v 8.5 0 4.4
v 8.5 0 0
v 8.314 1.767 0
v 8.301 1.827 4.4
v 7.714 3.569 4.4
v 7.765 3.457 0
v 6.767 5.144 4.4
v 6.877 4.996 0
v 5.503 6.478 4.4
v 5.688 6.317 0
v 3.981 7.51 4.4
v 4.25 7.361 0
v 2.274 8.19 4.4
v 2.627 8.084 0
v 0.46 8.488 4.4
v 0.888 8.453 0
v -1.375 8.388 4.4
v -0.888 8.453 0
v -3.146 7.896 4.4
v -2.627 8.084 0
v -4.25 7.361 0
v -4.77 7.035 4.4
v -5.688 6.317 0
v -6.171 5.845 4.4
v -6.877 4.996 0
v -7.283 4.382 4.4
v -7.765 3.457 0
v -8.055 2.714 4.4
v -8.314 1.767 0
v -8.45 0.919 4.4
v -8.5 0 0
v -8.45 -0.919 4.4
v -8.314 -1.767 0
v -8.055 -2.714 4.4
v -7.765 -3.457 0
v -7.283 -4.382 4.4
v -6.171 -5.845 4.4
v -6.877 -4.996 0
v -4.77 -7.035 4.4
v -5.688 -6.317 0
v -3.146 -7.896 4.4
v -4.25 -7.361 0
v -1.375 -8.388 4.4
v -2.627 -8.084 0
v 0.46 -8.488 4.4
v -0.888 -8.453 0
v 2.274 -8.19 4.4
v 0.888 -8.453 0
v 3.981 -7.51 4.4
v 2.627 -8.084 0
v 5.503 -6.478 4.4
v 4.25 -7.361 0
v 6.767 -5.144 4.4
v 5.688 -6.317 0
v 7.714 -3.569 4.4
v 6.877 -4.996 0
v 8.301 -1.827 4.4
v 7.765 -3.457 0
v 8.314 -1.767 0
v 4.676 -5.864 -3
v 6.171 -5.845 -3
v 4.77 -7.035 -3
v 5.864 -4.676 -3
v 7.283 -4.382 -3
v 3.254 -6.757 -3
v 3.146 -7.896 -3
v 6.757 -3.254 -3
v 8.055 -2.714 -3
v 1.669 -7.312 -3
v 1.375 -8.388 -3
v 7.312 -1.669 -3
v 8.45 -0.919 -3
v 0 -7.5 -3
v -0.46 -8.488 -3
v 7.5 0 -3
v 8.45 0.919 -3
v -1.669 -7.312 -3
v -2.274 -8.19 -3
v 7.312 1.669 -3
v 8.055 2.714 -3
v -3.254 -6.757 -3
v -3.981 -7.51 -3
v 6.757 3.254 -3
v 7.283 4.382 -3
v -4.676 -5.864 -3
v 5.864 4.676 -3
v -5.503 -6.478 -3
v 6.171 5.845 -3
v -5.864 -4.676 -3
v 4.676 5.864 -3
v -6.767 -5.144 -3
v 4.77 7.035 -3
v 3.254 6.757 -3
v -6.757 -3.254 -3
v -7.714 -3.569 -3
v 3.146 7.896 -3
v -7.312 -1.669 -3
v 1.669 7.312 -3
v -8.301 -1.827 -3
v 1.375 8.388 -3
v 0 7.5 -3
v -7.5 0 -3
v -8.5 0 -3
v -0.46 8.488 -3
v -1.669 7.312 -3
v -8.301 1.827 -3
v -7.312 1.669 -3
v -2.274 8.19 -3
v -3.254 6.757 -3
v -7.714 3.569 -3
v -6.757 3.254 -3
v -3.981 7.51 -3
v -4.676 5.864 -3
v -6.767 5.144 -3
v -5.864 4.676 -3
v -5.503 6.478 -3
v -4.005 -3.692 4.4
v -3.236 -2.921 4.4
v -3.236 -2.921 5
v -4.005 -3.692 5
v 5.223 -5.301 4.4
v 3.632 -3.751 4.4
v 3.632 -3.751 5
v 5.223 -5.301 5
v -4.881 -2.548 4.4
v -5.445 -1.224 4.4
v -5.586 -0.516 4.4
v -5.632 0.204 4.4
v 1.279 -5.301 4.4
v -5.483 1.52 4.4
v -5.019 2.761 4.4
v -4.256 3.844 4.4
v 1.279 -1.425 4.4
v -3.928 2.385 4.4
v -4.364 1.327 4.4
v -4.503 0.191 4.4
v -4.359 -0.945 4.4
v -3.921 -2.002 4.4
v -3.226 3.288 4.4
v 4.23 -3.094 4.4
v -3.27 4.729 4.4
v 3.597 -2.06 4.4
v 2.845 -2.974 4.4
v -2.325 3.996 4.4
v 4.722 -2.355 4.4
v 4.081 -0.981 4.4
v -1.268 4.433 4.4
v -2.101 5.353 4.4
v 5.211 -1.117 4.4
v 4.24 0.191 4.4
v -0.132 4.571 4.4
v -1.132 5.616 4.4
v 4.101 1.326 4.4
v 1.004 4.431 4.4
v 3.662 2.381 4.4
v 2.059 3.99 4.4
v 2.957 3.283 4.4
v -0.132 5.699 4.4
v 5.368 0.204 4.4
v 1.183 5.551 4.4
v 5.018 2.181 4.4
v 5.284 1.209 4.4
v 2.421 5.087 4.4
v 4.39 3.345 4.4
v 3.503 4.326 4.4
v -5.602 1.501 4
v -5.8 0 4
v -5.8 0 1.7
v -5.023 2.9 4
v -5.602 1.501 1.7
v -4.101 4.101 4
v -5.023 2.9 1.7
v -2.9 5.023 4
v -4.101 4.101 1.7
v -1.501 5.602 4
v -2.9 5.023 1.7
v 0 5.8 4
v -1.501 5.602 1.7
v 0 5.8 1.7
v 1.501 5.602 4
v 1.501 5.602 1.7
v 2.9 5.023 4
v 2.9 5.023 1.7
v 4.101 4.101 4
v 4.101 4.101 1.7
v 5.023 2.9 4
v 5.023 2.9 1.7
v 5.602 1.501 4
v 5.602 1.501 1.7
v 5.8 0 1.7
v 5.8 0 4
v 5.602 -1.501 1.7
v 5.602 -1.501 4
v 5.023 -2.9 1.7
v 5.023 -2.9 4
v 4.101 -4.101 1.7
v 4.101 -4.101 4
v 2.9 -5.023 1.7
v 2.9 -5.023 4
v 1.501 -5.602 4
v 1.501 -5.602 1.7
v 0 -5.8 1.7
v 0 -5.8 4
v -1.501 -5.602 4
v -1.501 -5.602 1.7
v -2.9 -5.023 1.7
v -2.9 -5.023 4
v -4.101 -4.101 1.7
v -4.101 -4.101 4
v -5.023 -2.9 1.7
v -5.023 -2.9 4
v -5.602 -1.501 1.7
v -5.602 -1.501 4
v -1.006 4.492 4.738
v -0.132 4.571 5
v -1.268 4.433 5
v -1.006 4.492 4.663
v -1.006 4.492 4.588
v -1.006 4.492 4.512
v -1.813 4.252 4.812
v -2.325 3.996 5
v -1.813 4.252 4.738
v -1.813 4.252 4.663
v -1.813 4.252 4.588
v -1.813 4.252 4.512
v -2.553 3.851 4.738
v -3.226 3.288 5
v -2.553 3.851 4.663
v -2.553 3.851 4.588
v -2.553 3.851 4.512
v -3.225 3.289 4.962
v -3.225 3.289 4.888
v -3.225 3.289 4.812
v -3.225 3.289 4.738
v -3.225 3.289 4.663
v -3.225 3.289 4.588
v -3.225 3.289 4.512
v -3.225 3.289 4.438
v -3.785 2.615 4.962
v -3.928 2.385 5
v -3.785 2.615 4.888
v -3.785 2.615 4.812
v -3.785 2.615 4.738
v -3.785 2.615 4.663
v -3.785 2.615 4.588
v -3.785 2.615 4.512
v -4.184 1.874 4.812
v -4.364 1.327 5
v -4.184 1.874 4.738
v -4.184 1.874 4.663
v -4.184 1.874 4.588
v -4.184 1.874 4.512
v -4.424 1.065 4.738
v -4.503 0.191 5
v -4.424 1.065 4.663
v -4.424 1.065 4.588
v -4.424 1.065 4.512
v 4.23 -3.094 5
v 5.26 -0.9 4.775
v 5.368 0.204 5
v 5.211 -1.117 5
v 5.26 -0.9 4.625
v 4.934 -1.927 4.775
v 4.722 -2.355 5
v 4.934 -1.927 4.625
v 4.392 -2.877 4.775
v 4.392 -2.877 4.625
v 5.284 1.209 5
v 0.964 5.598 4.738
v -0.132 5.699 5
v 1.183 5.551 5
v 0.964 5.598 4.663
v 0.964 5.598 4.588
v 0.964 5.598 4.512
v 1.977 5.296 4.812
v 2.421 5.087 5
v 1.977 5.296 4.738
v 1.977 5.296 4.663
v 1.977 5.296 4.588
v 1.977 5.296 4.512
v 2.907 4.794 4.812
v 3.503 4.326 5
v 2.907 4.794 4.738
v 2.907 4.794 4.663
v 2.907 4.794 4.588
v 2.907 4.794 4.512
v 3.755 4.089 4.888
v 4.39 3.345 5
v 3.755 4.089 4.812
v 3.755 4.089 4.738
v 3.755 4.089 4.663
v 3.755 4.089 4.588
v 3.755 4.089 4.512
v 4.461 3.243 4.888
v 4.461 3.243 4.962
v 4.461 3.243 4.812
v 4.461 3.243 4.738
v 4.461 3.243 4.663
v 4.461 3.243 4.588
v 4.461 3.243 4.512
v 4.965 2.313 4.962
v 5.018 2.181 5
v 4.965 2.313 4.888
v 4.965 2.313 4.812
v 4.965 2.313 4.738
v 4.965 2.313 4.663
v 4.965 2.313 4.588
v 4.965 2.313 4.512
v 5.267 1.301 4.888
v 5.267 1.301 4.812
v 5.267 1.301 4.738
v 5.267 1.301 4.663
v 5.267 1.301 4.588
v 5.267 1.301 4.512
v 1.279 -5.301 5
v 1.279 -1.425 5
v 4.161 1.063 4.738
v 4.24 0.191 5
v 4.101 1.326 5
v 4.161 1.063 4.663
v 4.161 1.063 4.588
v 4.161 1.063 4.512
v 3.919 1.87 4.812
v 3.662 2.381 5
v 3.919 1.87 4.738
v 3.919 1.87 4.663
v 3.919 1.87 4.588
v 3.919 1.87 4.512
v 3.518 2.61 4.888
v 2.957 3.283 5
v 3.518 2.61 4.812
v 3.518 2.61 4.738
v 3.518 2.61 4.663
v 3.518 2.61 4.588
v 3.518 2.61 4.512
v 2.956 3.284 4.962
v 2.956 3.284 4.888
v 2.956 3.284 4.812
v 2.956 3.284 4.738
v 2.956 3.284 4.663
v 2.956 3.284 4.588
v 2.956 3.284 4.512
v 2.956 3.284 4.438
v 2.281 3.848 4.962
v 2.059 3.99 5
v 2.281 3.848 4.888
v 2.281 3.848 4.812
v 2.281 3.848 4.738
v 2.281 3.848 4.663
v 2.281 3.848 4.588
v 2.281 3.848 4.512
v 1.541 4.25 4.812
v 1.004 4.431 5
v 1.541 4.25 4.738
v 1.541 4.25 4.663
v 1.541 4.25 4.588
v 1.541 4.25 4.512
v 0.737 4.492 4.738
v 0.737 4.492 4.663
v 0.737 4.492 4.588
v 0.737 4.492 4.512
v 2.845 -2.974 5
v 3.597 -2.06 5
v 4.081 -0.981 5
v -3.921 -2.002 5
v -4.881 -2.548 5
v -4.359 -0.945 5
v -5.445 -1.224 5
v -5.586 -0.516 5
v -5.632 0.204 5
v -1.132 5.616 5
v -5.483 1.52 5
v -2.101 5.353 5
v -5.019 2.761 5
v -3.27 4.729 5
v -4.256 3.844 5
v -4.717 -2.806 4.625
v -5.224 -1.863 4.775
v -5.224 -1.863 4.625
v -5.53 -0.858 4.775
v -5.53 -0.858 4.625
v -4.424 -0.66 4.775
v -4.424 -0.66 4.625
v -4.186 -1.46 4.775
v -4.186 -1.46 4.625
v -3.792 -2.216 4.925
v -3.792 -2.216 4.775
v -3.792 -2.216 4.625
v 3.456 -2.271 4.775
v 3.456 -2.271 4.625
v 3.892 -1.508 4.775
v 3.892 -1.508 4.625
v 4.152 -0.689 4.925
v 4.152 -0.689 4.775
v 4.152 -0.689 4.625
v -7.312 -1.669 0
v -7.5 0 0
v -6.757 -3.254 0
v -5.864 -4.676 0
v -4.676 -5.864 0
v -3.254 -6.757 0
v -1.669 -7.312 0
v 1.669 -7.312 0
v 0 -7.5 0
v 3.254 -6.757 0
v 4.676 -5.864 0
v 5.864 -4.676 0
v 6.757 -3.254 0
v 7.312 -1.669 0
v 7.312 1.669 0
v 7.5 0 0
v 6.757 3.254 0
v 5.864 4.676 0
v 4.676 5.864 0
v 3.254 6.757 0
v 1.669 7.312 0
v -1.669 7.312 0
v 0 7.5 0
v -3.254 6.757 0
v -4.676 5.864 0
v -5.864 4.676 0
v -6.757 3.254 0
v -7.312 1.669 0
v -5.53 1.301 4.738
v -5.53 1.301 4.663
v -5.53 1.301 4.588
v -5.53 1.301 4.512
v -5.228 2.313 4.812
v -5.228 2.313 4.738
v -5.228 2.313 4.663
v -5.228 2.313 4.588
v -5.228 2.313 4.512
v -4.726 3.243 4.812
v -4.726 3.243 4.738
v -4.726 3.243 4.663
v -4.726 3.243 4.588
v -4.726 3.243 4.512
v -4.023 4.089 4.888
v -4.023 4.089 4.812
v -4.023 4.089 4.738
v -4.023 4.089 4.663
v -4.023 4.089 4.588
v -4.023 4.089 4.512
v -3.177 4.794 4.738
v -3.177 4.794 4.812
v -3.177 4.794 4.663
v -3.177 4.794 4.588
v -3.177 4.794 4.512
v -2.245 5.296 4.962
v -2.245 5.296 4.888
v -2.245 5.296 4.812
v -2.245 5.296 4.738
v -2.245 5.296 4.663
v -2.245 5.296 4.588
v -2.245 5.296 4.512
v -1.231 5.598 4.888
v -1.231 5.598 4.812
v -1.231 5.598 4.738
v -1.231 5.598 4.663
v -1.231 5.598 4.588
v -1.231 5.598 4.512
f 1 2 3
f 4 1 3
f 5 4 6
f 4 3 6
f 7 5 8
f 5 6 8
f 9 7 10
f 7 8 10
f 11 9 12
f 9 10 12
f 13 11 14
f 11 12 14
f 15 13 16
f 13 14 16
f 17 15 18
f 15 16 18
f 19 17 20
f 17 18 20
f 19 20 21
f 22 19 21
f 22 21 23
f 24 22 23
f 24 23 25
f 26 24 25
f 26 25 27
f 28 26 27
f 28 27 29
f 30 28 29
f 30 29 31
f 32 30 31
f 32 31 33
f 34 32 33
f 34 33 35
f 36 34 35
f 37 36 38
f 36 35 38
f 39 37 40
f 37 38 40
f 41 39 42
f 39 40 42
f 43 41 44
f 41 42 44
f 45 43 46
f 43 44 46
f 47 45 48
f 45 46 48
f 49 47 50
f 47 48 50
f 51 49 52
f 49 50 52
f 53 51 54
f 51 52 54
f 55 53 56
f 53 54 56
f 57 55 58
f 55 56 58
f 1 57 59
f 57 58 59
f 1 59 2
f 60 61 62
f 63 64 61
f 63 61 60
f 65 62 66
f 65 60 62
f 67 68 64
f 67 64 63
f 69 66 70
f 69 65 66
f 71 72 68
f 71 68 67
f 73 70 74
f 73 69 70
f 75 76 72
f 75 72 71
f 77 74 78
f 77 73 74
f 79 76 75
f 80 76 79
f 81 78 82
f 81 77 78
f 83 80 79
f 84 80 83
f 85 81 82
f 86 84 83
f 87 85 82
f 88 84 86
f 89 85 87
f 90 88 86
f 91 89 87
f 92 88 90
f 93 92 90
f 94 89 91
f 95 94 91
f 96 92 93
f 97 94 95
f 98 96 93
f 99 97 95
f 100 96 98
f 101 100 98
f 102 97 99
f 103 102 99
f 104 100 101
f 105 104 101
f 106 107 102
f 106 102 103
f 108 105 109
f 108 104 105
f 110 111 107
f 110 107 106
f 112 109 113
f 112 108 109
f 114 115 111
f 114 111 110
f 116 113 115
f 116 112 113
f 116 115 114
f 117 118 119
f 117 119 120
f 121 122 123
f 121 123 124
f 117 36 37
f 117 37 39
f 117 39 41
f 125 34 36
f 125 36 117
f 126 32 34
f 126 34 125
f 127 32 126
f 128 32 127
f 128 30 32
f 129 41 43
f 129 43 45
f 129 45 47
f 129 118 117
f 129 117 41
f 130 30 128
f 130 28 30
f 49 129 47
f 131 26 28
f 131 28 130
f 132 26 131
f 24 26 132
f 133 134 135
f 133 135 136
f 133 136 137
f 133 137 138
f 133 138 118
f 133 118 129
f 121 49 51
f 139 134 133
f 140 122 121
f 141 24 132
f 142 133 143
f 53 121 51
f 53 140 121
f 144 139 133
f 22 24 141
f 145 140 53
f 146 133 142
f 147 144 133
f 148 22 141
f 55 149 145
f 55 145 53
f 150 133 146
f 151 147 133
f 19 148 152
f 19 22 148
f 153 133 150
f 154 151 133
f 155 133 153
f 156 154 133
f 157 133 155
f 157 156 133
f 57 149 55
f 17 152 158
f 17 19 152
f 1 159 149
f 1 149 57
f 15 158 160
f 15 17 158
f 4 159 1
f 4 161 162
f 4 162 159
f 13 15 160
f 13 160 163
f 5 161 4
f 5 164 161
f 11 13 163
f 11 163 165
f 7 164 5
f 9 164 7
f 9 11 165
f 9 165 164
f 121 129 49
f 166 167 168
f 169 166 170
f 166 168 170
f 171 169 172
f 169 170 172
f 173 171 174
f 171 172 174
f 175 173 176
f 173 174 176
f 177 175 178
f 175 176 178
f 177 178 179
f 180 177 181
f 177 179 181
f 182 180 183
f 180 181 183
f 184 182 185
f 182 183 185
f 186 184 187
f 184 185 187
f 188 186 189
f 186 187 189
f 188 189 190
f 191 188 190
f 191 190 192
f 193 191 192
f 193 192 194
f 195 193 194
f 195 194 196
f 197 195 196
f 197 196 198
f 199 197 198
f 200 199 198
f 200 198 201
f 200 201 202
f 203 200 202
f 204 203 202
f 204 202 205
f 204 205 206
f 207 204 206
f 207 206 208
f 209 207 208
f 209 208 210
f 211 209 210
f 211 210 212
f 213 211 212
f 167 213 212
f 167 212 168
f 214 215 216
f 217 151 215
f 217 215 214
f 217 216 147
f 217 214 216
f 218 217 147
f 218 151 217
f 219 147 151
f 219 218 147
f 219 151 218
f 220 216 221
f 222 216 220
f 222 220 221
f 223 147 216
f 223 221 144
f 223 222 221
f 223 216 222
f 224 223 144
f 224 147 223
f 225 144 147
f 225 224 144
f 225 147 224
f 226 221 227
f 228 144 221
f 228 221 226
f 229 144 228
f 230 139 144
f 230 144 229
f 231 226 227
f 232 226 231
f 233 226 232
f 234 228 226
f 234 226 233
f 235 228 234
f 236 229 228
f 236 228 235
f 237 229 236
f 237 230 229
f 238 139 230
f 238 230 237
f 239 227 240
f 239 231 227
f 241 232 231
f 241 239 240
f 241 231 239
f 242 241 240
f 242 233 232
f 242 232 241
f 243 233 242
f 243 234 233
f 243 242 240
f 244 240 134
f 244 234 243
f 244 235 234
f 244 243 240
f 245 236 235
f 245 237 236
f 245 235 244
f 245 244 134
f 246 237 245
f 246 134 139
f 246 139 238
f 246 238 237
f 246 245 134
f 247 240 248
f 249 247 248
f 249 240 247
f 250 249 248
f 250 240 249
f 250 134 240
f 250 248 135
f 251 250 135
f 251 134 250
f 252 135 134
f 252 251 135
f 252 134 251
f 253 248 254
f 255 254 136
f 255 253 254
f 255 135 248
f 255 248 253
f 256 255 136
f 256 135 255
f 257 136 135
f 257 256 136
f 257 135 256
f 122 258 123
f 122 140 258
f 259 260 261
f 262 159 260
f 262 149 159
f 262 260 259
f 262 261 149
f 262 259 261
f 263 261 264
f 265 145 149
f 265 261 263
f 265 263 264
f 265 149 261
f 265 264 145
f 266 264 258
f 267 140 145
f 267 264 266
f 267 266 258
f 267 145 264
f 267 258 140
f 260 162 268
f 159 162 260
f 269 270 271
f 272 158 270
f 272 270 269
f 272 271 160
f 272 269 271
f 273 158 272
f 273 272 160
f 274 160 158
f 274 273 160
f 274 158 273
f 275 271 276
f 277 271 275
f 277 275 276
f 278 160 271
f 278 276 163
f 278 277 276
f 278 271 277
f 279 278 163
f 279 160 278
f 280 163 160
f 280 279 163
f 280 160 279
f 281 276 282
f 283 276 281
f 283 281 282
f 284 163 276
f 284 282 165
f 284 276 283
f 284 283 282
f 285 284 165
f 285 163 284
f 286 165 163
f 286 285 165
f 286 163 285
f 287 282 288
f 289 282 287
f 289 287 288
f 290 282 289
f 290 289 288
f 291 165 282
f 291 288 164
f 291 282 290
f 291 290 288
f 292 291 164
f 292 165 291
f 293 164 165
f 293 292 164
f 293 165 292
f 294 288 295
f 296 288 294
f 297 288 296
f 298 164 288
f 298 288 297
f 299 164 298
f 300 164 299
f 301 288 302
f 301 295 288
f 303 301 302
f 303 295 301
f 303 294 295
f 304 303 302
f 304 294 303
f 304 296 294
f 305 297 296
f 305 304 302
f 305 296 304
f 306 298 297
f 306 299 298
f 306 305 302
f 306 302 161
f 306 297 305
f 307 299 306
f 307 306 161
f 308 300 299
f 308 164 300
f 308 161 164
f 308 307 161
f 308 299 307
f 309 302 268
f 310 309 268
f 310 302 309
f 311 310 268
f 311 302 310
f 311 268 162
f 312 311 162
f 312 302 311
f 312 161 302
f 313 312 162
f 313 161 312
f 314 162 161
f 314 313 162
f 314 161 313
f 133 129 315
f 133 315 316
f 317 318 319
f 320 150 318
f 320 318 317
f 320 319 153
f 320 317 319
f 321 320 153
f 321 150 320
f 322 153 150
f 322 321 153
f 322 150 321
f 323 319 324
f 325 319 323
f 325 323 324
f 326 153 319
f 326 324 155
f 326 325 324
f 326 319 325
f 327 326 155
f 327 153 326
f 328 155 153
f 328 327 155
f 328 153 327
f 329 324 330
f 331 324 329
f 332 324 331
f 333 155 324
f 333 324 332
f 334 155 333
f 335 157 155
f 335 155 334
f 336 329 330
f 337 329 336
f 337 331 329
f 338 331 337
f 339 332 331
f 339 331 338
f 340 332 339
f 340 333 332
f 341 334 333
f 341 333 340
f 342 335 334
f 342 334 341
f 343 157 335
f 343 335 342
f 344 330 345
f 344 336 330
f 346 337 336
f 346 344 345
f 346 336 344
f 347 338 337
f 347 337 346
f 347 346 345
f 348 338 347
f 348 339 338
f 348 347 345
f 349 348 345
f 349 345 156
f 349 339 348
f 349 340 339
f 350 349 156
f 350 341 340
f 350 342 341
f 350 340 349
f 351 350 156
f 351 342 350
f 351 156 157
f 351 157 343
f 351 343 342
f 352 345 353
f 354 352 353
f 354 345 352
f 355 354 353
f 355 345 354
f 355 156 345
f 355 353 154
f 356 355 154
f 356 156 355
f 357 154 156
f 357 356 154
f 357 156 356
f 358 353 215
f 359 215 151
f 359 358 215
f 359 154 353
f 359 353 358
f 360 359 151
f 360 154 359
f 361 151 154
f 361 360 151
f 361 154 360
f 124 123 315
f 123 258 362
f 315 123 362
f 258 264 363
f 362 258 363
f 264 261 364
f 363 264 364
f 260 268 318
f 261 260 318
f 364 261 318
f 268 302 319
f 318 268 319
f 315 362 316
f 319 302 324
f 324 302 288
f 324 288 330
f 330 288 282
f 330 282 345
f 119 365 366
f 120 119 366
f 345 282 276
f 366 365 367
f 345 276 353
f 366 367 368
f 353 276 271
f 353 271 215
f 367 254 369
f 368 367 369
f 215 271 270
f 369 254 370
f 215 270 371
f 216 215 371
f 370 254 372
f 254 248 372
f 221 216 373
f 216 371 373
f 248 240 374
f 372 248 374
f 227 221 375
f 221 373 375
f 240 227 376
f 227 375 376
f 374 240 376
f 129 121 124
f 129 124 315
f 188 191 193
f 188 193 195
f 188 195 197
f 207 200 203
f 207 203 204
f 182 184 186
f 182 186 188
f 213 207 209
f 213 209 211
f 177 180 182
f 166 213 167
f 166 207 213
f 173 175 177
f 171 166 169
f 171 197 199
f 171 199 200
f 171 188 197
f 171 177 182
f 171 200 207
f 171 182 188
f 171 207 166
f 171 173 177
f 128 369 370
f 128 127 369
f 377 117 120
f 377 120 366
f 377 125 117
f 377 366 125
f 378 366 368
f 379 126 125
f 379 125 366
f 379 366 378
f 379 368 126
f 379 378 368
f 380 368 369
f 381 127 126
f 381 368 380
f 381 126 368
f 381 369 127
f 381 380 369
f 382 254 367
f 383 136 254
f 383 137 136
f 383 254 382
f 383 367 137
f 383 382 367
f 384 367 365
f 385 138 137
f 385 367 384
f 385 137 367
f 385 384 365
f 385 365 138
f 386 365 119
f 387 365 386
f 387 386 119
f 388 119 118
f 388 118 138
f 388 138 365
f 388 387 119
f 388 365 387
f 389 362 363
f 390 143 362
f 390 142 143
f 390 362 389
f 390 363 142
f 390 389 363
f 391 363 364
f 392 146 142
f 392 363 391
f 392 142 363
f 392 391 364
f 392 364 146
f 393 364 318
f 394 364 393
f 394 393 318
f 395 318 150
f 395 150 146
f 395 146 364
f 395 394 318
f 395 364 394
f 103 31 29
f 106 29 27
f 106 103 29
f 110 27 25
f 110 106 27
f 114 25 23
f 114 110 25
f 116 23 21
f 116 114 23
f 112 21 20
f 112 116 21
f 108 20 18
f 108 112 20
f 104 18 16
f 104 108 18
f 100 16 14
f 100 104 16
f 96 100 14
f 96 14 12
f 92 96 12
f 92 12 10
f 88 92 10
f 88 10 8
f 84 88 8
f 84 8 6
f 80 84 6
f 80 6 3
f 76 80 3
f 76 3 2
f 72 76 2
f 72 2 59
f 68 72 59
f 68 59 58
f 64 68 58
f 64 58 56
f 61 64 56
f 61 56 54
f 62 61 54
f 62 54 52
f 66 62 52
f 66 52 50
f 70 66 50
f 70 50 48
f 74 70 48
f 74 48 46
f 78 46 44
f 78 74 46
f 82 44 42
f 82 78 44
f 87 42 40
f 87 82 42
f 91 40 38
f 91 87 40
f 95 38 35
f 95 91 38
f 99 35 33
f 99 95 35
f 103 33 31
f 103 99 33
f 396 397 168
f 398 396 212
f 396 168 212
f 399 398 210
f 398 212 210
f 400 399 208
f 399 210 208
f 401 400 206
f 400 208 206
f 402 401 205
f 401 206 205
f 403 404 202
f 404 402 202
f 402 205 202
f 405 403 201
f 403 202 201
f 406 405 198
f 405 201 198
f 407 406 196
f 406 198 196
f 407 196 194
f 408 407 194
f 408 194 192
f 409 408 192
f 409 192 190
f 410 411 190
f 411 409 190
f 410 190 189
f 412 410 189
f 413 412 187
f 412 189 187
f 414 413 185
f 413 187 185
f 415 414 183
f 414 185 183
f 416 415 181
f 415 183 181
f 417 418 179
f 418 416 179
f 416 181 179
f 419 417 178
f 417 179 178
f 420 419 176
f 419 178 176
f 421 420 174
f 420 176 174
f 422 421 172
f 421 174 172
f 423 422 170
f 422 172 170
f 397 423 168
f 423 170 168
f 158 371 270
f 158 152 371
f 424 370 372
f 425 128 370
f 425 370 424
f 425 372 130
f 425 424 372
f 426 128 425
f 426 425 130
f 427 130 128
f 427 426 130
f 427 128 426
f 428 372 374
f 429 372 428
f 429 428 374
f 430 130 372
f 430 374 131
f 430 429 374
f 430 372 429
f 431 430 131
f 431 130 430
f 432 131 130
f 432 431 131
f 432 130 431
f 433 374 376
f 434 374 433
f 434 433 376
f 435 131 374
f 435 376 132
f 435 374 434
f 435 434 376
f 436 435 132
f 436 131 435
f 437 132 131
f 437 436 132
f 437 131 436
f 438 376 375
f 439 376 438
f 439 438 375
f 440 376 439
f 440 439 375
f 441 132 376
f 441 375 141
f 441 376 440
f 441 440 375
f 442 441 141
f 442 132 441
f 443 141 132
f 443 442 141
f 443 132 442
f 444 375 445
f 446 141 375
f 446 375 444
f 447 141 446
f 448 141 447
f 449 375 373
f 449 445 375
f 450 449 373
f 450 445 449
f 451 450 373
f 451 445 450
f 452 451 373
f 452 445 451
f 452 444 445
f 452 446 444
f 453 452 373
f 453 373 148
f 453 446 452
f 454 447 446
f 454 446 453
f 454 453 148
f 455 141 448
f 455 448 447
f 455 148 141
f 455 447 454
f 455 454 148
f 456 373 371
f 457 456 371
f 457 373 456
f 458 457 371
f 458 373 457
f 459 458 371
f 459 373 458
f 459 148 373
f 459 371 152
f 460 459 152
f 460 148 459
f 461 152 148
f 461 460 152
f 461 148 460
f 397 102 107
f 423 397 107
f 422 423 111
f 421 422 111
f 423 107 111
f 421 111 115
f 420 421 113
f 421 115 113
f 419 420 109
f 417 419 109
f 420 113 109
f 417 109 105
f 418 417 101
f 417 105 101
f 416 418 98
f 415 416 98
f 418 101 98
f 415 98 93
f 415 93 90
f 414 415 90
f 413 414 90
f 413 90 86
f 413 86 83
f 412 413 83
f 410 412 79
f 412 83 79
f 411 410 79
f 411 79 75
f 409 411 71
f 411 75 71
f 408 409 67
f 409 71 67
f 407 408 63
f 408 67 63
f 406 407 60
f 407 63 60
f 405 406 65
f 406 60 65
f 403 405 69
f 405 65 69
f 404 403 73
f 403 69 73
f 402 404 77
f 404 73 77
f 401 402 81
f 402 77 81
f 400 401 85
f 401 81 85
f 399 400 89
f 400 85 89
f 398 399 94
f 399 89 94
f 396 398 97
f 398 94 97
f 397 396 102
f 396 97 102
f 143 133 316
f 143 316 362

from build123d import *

# Parameters (mm, degrees)
SKETCH1_R           = 8.5
BOSS_EXTRUDE1_DEPTH = 4.4
SKETCH3_R           = 5.8
CUT_EXTRUDE1_DEPTH  = 4
BOSS_EXTRUDE3_START = 3
SKETCH4_R           = 8.5
SKETCH4_R_2         = 7.5
BOSS_EXTRUDE3_DEPTH = 3
BOSS_EXTRUDE4_DEPTH = 0.6


with BuildPart() as part:
    # Sketch1 → Boss-Extrude1 (new body)
    with BuildSketch(Plane.XY):
        Circle(SKETCH1_R)
    extrude(amount=BOSS_EXTRUDE1_DEPTH)

    # Sketch3 → Cut-Extrude1 (cut)
    with BuildSketch(Plane(origin=(0, 0, 0), x_dir=(-1, 0, 0), z_dir=(0, 0, -1))):
        Circle(SKETCH3_R)
    extrude(amount=-CUT_EXTRUDE1_DEPTH, mode=Mode.SUBTRACT)

    # Sketch4 → Boss-Extrude3 (add)
    with BuildSketch(Plane(origin=(0, 0, 0), x_dir=(-1, 0, 0), z_dir=(0, 0, -1)).offset(BOSS_EXTRUDE3_START)):
        Circle(SKETCH4_R)
        Circle(SKETCH4_R_2, mode=Mode.SUBTRACT)
    extrude(amount=-BOSS_EXTRUDE3_DEPTH)

    # Sketch6 → Cut-Revolve1 (revolve, cut)
    with BuildSketch(Plane(origin=(0, 0, 0), x_dir=(1, 0, 0), z_dir=(0, 1, 0)), mode=Mode.PRIVATE) as cut_revolve1_sk:
        Polygon((7.5, 0), (5.8, -1.7), (5.8, 0), align=None)
    revolve(cut_revolve1_sk.sketch.rotate(Axis((0, 0, -5.5), (0, 0, 1)), 180), axis=Axis((0, 0, -5.5), (0, 0, 1)), mode=Mode.SUBTRACT)

    # Sketch2 → Boss-Extrude4 (add)
    with BuildSketch(Plane.XY.offset(4.4)):
        with BuildLine():
            Line((3.632089791, -3.751482391), (5.223035304, -5.300560917))
            Line((5.223035304, -5.300560917), (1.278724407, -5.300560917))
            Line((1.278724407, -5.300560917), (1.278724407, -1.424559314))
            Line((1.278724407, -1.424559314), (2.845431137, -2.97363784))
            add(Edge.make_bspline(
                [(2.845431137, -2.97363784), (2.95632075, -2.861034584), (3.174405253, -2.639579891), (3.459213248, -2.278430368), (3.70074243, -1.902868481), (3.898794049, -1.512590066), (4.05164193, -1.107607515), (4.159151203, -0.687847174), (4.228166952, -0.253828699), (4.236197805, 0.041257842), (4.240262868, 0.190624981)],
                knots=[0, 0, 0, 0, 1.065567823, 2.095632081, 3.096325677, 4.073630942, 5.042774034, 6.010294195, 6.992849145, 8, 8, 8, 8], degree=3))
            add(Edge.make_bspline(
                [(4.240262868, 0.190624981), (4.236521971, 0.339185131), (4.229157297, 0.631654273), (4.16882099, 1.061635432), (4.066106532, 1.474567413), (3.926128217, 1.87176171), (3.742510622, 2.251822429), (3.522034828, 2.616182439), (3.260511136, 2.964392602), (2.959512286, 3.288301222), (2.634991287, 3.589186758), (2.288400016, 3.852429668), (1.924418043, 4.074704619), (1.543968163, 4.255940011), (1.147484032, 4.397650491), (0.735726783, 4.499431142), (0.30732266, 4.560199144), (0.016301238, 4.567516752), (-0.131532004, 4.571233955)],
                knots=[0, 0, 0, 0, 1.036283767, 2.0401233, 3.022098945, 4.001181535, 4.973115426, 5.961928152, 6.96848522, 8.005845645, 9.043206071, 10.052850644, 11.037284036, 12.013841621, 12.988096842, 13.970072486, 14.968836162, 16, 16, 16, 16], degree=3))
            add(Edge.make_bspline(
                [(-0.131532004, 4.571233955), (-0.280088337, 4.567459865), (-0.573277686, 4.560011356), (-1.00473588, 4.499828874), (-1.418221214, 4.397341401), (-1.816346635, 4.258767128), (-2.196115848, 4.076581392), (-2.560226583, 3.855519569), (-2.903891125, 3.590363046), (-3.230152733, 3.293680989), (-3.527552899, 2.967768525), (-3.790083641, 2.621418652), (-4.007152184, 2.255441675), (-4.192132355, 1.876734755), (-4.328849407, 1.477819774), (-4.432036389, 1.063874926), (-4.49207445, 0.632358672), (-4.499542755, 0.339177282), (-4.503326876, 0.190624981)],
                knots=[0, 0, 0, 0, 1.035427484, 2.043509704, 3.02964574, 4.001383878, 4.977134532, 5.960754486, 6.96548856, 7.998532717, 9.031576874, 10.037302222, 11.022653504, 11.993784286, 12.97035426, 13.956490296, 14.964572516, 16, 16, 16, 16], degree=3))
            add(Edge.make_bspline(
                [(-4.503326876, 0.190624981), (-4.499608767, 0.046452954), (-4.492253992, -0.238733168), (-4.430784866, -0.659467236), (-4.331445734, -1.067569513), (-4.19188491, -1.463967176), (-4.01175723, -1.848290505), (-3.795509518, -2.222691708), (-3.53699416, -2.583569925), (-3.337577276, -2.80718571), (-3.236299632, -2.920753225)],
                knots=[0, 0, 0, 0, 1.00470997, 1.987412856, 2.957385615, 3.929100441, 4.911910053, 5.912278307, 6.939710965, 8, 8, 8, 8], degree=3))
            Line((-3.236299632, -2.920753225), (-4.005330081, -3.691987199))
            add(Edge.make_bspline(
                [(-4.005330081, -3.691987199), (-4.135271474, -3.549666878), (-4.391109201, -3.269456652), (-4.719311464, -2.815225768), (-5.004332233, -2.351060045), (-5.230143754, -1.867949003), (-5.411519251, -1.371567784), (-5.538708635, -0.859768832), (-5.615741653, -0.332482335), (-5.62622625, 0.023633109), (-5.631532004, 0.203846134)],
                knots=[0, 0, 0, 0, 1.067518229, 2.101804739, 3.101067448, 4.082788766, 5.052650977, 6.026360255, 7.001235147, 8, 8, 8, 8], degree=3))
            add(Edge.make_bspline(
                [(-5.631532004, 0.203846134), (-5.627457502, 0.390708619), (-5.619432553, 0.758744313), (-5.538520982, 1.298672582), (-5.414249777, 1.818110739), (-5.235843212, 2.315782791), (-5.011649393, 2.795149888), (-4.73042278, 3.250028561), (-4.403608666, 3.686459458), (-4.028557339, 4.094332656), (-3.619894559, 4.468793147), (-3.185532677, 4.799872374), (-2.726214157, 5.075680655), (-2.248647615, 5.304538365), (-1.749434149, 5.482282496), (-1.22855864, 5.606437585), (-0.687143546, 5.687225777), (-0.318389709, 5.695331626), (-0.131532004, 5.699439083)],
                knots=[0, 0, 0, 0, 1.036548909, 2.041538722, 3.023471865, 3.997074745, 4.970976362, 5.955504589, 6.960097362, 7.993216813, 9.026336264, 10.033383207, 11.019278073, 11.994927594, 12.968530475, 13.95442534, 14.963451091, 16, 16, 16, 16], degree=3))
            add(Edge.make_bspline(
                [(-0.131532004, 5.699439083), (0.054595523, 5.695345882), (0.421895617, 5.687268445), (0.961779629, 5.606175508), (1.481981128, 5.482330381), (1.981120847, 5.30443921), (2.458381777, 5.076303735), (2.916213765, 4.799218389), (3.350458552, 4.468265022), (3.760990035, 4.094356336), (4.138315988, 3.687117495), (4.465256719, 3.250043032), (4.745894958, 2.794580246), (4.973314126, 2.316382013), (5.151012636, 1.818029141), (5.275504478, 1.29869497), (5.356356116, 0.758738455), (5.364389309, 0.390706646), (5.368467996, 0.203846134)],
                knots=[0, 0, 0, 0, 1.032739074, 2.037985287, 3.024131681, 3.997982954, 4.97388139, 5.956539052, 6.96384292, 8.000239142, 9.03637858, 10.041227652, 11.026007058, 12.001905494, 12.975756767, 13.957940427, 14.96318664, 16, 16, 16, 16], degree=3))
            add(Edge.make_bspline(
                [(5.368467996, 0.203846134), (5.363680287, 0.016248292), (5.354227058, -0.354159577), (5.270200799, -0.899409197), (5.132702079, -1.4248242), (4.943051484, -1.932209131), (4.696350305, -2.419026583), (4.396055183, -2.886430144), (4.043519788, -3.336927549), (3.770889078, -3.611628912), (3.632089791, -3.751482391)],
                knots=[0, 0, 0, 0, 1.01247621, 1.999112297, 2.970711092, 3.940884138, 4.91819732, 5.911673186, 6.936809893, 8, 8, 8, 8], degree=3))
        make_face()
    extrude(amount=BOSS_EXTRUDE4_DEPTH)


solid = part.part
